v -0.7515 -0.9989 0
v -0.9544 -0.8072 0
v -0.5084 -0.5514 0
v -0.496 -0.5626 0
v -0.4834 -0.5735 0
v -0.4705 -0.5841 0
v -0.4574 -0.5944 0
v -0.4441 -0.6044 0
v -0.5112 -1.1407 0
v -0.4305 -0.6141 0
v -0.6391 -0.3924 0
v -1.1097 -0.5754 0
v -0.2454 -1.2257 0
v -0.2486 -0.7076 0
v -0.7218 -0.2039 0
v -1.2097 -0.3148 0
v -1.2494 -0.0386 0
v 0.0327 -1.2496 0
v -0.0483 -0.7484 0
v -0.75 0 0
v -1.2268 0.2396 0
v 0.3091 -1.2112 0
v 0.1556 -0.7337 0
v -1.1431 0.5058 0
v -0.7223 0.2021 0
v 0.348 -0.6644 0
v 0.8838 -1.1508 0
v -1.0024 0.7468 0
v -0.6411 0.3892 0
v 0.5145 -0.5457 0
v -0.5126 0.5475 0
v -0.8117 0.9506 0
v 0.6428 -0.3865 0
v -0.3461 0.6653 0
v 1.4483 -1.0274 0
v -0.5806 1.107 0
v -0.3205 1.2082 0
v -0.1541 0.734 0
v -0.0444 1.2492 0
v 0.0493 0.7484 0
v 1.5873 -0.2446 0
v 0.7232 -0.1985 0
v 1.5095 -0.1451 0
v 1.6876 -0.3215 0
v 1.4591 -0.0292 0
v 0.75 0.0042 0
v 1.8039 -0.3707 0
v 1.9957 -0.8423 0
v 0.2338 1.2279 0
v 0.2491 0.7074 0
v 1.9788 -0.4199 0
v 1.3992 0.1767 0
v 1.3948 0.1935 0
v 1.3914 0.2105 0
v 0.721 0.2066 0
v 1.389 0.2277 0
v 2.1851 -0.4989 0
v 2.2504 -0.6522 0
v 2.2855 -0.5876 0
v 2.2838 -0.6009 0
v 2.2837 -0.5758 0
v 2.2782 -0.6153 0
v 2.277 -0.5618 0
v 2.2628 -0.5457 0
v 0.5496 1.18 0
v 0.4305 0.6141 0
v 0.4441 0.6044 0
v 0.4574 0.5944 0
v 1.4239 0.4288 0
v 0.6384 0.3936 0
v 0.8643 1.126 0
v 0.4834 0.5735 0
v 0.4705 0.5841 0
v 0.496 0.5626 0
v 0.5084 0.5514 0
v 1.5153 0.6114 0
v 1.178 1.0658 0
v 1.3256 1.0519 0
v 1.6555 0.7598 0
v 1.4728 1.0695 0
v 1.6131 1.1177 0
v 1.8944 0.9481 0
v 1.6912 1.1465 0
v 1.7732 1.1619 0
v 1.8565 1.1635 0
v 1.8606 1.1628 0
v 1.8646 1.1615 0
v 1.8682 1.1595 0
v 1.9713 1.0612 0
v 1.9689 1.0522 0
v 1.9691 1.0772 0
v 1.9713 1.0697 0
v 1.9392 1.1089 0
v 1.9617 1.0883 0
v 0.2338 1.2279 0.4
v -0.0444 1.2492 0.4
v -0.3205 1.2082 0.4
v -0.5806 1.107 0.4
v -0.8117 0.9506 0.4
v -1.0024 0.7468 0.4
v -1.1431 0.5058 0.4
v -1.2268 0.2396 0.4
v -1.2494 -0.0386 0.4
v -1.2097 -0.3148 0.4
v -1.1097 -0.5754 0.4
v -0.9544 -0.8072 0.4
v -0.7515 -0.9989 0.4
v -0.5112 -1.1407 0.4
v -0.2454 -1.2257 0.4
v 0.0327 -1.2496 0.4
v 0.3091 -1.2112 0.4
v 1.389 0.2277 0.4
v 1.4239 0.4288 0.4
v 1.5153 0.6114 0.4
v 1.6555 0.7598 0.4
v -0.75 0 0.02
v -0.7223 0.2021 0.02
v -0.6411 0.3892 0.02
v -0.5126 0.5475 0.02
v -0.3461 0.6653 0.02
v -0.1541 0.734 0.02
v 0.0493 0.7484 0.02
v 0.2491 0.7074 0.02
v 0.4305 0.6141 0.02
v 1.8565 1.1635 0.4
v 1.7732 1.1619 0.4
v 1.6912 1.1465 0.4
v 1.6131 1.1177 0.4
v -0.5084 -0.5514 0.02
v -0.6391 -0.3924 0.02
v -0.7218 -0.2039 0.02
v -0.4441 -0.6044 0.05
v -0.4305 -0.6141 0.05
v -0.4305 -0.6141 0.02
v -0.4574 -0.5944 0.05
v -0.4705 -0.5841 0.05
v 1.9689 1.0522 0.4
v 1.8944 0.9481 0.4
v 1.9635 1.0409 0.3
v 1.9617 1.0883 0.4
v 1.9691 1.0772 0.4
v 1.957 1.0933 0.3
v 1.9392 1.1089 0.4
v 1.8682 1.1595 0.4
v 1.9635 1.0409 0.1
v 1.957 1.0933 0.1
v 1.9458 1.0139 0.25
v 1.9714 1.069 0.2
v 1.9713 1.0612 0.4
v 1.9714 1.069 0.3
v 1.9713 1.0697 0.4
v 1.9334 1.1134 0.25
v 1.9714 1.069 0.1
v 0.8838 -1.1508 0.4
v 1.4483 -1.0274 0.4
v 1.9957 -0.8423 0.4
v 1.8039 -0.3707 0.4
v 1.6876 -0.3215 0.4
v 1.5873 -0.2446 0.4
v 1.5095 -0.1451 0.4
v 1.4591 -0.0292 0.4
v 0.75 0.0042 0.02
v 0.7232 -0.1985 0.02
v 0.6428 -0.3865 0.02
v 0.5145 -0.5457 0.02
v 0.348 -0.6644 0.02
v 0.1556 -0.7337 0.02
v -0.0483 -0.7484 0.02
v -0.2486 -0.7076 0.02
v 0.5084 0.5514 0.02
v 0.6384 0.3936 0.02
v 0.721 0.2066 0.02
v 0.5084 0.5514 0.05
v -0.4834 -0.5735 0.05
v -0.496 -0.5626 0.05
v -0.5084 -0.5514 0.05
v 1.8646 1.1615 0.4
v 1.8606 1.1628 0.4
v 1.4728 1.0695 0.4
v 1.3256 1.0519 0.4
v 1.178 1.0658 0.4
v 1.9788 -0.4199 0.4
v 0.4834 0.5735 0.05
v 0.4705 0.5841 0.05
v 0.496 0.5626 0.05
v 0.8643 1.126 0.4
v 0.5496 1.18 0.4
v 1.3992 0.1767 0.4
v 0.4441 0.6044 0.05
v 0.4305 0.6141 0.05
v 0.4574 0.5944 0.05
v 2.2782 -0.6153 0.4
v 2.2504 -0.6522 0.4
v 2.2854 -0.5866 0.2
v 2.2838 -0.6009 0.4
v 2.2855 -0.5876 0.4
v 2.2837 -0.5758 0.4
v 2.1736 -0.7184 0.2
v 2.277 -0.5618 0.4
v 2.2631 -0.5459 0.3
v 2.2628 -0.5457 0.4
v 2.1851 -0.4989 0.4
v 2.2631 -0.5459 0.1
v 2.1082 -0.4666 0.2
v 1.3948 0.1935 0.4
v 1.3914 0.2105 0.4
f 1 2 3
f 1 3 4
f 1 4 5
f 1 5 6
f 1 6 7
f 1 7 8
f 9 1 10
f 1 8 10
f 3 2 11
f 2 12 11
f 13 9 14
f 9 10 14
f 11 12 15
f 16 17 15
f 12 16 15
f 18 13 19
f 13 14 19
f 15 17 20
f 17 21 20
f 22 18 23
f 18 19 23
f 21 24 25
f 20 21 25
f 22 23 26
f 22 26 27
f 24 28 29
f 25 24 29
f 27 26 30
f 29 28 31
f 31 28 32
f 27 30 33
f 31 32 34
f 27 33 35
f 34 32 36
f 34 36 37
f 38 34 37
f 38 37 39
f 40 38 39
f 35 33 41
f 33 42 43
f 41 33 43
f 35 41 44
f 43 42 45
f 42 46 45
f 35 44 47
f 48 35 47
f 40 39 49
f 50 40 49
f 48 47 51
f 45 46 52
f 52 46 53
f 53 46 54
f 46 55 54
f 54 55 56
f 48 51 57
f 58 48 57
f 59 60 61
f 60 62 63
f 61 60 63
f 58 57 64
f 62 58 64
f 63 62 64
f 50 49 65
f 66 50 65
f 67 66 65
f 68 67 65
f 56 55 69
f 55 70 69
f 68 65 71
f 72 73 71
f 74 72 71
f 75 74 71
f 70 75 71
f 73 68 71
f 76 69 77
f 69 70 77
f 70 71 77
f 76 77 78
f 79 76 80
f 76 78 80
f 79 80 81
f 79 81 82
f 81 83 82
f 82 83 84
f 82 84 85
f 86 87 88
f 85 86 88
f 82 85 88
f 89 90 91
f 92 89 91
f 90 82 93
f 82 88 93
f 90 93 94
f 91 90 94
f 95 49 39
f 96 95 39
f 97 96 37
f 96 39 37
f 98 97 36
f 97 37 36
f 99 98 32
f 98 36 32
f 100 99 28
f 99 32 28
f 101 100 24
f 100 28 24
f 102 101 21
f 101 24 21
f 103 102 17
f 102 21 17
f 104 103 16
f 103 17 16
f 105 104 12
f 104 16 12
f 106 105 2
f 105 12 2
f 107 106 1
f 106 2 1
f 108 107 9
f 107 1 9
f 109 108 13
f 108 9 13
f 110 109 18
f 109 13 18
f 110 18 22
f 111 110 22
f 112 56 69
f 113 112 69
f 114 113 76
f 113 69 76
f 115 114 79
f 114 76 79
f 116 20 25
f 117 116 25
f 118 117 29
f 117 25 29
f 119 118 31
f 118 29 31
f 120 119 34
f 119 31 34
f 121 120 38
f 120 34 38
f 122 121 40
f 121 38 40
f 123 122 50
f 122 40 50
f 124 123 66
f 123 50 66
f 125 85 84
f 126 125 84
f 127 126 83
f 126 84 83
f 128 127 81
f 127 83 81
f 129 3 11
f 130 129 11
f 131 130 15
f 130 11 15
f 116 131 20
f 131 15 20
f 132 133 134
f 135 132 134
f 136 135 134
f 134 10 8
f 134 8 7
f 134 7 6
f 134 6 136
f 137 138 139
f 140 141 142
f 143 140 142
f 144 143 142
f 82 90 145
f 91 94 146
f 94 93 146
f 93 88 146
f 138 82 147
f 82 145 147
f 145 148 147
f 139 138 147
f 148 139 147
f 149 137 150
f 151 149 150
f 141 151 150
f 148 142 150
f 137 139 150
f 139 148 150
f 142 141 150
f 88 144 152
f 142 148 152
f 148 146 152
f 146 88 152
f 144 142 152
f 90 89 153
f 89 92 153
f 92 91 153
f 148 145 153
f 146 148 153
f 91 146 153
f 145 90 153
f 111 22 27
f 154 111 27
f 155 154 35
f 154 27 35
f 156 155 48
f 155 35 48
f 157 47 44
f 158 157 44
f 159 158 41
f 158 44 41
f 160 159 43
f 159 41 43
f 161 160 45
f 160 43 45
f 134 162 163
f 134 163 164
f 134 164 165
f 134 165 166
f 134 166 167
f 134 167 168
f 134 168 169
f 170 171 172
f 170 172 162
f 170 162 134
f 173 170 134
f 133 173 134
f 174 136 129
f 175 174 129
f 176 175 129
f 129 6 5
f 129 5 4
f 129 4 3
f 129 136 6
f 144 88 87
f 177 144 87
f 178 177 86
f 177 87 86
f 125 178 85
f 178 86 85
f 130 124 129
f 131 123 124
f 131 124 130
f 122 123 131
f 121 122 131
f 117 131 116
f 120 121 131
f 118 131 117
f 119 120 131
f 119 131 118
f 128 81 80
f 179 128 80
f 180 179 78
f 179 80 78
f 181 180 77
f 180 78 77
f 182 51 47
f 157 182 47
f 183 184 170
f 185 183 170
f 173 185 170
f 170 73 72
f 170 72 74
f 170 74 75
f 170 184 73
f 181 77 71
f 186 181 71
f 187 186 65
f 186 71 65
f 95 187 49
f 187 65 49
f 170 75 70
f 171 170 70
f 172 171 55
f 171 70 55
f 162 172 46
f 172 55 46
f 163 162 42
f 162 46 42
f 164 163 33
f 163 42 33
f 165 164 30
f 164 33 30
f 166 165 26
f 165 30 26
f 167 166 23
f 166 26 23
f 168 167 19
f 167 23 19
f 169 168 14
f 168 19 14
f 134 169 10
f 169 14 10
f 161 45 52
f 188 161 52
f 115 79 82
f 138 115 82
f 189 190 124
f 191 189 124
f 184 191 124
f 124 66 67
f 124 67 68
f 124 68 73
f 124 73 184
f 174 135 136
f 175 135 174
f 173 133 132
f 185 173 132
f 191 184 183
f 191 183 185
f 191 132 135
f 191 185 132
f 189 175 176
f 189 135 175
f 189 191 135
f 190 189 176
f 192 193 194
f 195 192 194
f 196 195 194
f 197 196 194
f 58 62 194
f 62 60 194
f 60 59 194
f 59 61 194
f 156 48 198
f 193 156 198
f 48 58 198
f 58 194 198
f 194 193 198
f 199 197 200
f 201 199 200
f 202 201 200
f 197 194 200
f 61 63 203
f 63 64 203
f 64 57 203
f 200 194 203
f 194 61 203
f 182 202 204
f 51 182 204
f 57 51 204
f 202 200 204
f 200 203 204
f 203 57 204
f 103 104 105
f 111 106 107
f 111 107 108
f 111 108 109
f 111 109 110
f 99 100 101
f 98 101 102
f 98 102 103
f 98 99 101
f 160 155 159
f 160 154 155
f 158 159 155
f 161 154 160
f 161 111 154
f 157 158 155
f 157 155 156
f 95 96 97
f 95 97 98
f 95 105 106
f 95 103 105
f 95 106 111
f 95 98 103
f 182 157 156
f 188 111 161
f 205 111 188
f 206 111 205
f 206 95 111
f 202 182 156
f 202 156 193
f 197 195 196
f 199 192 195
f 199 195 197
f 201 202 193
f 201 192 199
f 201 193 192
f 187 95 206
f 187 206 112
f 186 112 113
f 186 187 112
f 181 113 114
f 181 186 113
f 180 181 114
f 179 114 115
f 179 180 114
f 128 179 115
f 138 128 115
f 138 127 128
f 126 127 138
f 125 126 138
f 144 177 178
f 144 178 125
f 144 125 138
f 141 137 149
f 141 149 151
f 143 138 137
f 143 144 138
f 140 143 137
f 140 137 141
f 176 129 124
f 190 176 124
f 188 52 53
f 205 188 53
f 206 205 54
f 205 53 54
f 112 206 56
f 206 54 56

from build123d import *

# Parameters (mm, degrees)
BOSS_EXTRUDE1_DEPTH = 0.4
CUT_EXTRUDE1_DEPTH  = 0.02
CUT_EXTRUDE2_DEPTH  = 0.05


with BuildPart() as part:
    # Sketch1 → Boss-Extrude1 (new body)
    # profile 1 of 3: a face of its own
    with BuildSketch(Plane.XY):
        with BuildLine():
            Line((1.655472948, 0.75976417), (1.894411836, 0.948096738))
            add(Edge.make_bspline(
                [(1.894411836, 0.948096738), (1.995721098, 1.073095376), (1.868209238, 1.159457899)],
                knots=[0, 0, 0, 1, 1, 1], degree=2, weights=[1, 3.709412851, 1]))
            ThreePointArc((1.868209238, 1.159457899), (1.862616141, 1.162248589), (1.856487349, 1.163476835))
            ThreePointArc((1.856487349, 1.163476835), (1.731878841, 1.155950151), (1.613052317, 1.117685434))
            ThreePointArc((1.613052317, 1.117685434), (1.399671578, 1.056795841), (1.177954023, 1.065751723))
            ThreePointArc((1.177954023, 1.065751723), (0.707085833, 1.153787634), (0.233831734, 1.22793433))
            ThreePointArc((0.233831734, 1.22793433), (0.963013413, 0.796934857), (1.25, 0))
            ThreePointArc((1.25, 0), (0.987141366, -0.766845437), (0.309116921, -1.211175763))
            ThreePointArc((0.309116921, -1.211175763), (1.167763583, -1.096895018), (1.995721098, -0.842296251))
            add(Edge.make_bspline(
                [(1.995721098, -0.842296251), (2.410829332, -0.567859808), (1.978844778, -0.419894109)],
                knots=[0, 0, 0, 1, 1, 1], degree=2, weights=[1, 2.377964768, 1]))
            Line((1.978844778, -0.419894109), (1.803929697, -0.370743003))
            ThreePointArc((1.803929697, -0.370743003), (1.587306204, -0.244600422), (1.459129191, -0.029174468))
            Line((1.459129191, -0.029174468), (1.399170684, 0.176735325))
            ThreePointArc((1.399170684, 0.176735325), (1.392988311, 0.201999854), (1.389017546, 0.227704936))
            ThreePointArc((1.389017546, 0.227704936), (1.462895228, 0.523457058), (1.655472948, 0.75976417))
        make_face()
        with BuildLine():
            ThreePointArc((1.387326929, 0.252151163), (1.387922531, 0.23991078), (1.389017546, 0.227704936))
            ThreePointArc((1.389017546, 0.227704936), (1.388794522, 0.208988882), (1.389071983, 0.190273556))
            Line((1.389071983, 0.190273556), (1.387326929, 0.252151163))
        make_face(mode=Mode.SUBTRACT)
    # profile 2 of 3: a face of its own
    with BuildSketch(Plane.XY):
        with BuildLine():
            ThreePointArc((1.389071983, 0.190273556), (1.388794522, 0.208988882), (1.389017546, 0.227704936))
            ThreePointArc((1.389017546, 0.227704936), (1.387922531, 0.23991078), (1.387326929, 0.252151163))
            Line((1.387326929, 0.252151163), (1.389071983, 0.190273556))
        make_face()
    # profile 3 of 3: a face of its own
    with BuildSketch(Plane.XY):
        with BuildLine():
            ThreePointArc((1.25, 0), (0.963013413, 0.796934857), (0.233831734, 1.22793433))
            ThreePointArc((0.233831734, 1.22793433), (-1.249404987, -0.038563937), (0.309116921, -1.211175763))
            ThreePointArc((0.309116921, -1.211175763), (0.987141366, -0.766845437), (1.25, 0))
        make_face()
    extrude(amount=BOSS_EXTRUDE1_DEPTH)

    # Sketch2 → Cut-Extrude1 (cut)
    with BuildSketch(Plane(origin=(0, 0, 0), x_dir=(-1, 0, 0), z_dir=(0, 0, -1))):
        with BuildLine():
            Line((0.430503755, -0.614138842), (-0.508380064, 0.551407028))
            ThreePointArc((-0.508380064, 0.551407028), (-0.584072319, -0.470488604), (0.430503755, -0.614138842))
        make_face()
        with BuildLine():
            ThreePointArc((0.75, 0), (0.346137389, 0.665348712), (-0.430503755, 0.614138842))
            Line((-0.430503755, 0.614138842), (0.508380064, -0.551407028))
            ThreePointArc((0.508380064, -0.551407028), (0.686944338, -0.301010757), (0.75, 0))
        make_face()
    extrude(amount=-CUT_EXTRUDE1_DEPTH, mode=Mode.SUBTRACT)

    # Sketch2<3> → Cut-Extrude2 (cut)
    with BuildSketch(Plane(origin=(0, 0, 0), x_dir=(-1, 0, 0), z_dir=(0, 0, -1))):
        with BuildLine():
            ThreePointArc((-0.430503755, 0.614138842), (-0.450746943, 0.599439065), (-0.470488604, 0.584072319))
            Line((-0.470488604, 0.584072319), (0.470488604, -0.584072319))
            ThreePointArc((0.470488604, -0.584072319), (0.489706772, -0.568055699), (0.508380064, -0.551407028))
            Line((0.508380064, -0.551407028), (-0.430503755, 0.614138842))
        make_face()
        with BuildLine():
            Line((0.470488604, -0.584072319), (-0.470488604, 0.584072319))
            ThreePointArc((-0.470488604, 0.584072319), (-0.489706772, 0.568055699), (-0.508380064, 0.551407028))
            Line((-0.508380064, 0.551407028), (0.430503755, -0.614138842))
            ThreePointArc((0.430503755, -0.614138842), (0.450746943, -0.599439065), (0.470488604, -0.584072319))
        make_face()
    extrude(amount=-CUT_EXTRUDE2_DEPTH, mode=Mode.SUBTRACT)


solid = part.part
